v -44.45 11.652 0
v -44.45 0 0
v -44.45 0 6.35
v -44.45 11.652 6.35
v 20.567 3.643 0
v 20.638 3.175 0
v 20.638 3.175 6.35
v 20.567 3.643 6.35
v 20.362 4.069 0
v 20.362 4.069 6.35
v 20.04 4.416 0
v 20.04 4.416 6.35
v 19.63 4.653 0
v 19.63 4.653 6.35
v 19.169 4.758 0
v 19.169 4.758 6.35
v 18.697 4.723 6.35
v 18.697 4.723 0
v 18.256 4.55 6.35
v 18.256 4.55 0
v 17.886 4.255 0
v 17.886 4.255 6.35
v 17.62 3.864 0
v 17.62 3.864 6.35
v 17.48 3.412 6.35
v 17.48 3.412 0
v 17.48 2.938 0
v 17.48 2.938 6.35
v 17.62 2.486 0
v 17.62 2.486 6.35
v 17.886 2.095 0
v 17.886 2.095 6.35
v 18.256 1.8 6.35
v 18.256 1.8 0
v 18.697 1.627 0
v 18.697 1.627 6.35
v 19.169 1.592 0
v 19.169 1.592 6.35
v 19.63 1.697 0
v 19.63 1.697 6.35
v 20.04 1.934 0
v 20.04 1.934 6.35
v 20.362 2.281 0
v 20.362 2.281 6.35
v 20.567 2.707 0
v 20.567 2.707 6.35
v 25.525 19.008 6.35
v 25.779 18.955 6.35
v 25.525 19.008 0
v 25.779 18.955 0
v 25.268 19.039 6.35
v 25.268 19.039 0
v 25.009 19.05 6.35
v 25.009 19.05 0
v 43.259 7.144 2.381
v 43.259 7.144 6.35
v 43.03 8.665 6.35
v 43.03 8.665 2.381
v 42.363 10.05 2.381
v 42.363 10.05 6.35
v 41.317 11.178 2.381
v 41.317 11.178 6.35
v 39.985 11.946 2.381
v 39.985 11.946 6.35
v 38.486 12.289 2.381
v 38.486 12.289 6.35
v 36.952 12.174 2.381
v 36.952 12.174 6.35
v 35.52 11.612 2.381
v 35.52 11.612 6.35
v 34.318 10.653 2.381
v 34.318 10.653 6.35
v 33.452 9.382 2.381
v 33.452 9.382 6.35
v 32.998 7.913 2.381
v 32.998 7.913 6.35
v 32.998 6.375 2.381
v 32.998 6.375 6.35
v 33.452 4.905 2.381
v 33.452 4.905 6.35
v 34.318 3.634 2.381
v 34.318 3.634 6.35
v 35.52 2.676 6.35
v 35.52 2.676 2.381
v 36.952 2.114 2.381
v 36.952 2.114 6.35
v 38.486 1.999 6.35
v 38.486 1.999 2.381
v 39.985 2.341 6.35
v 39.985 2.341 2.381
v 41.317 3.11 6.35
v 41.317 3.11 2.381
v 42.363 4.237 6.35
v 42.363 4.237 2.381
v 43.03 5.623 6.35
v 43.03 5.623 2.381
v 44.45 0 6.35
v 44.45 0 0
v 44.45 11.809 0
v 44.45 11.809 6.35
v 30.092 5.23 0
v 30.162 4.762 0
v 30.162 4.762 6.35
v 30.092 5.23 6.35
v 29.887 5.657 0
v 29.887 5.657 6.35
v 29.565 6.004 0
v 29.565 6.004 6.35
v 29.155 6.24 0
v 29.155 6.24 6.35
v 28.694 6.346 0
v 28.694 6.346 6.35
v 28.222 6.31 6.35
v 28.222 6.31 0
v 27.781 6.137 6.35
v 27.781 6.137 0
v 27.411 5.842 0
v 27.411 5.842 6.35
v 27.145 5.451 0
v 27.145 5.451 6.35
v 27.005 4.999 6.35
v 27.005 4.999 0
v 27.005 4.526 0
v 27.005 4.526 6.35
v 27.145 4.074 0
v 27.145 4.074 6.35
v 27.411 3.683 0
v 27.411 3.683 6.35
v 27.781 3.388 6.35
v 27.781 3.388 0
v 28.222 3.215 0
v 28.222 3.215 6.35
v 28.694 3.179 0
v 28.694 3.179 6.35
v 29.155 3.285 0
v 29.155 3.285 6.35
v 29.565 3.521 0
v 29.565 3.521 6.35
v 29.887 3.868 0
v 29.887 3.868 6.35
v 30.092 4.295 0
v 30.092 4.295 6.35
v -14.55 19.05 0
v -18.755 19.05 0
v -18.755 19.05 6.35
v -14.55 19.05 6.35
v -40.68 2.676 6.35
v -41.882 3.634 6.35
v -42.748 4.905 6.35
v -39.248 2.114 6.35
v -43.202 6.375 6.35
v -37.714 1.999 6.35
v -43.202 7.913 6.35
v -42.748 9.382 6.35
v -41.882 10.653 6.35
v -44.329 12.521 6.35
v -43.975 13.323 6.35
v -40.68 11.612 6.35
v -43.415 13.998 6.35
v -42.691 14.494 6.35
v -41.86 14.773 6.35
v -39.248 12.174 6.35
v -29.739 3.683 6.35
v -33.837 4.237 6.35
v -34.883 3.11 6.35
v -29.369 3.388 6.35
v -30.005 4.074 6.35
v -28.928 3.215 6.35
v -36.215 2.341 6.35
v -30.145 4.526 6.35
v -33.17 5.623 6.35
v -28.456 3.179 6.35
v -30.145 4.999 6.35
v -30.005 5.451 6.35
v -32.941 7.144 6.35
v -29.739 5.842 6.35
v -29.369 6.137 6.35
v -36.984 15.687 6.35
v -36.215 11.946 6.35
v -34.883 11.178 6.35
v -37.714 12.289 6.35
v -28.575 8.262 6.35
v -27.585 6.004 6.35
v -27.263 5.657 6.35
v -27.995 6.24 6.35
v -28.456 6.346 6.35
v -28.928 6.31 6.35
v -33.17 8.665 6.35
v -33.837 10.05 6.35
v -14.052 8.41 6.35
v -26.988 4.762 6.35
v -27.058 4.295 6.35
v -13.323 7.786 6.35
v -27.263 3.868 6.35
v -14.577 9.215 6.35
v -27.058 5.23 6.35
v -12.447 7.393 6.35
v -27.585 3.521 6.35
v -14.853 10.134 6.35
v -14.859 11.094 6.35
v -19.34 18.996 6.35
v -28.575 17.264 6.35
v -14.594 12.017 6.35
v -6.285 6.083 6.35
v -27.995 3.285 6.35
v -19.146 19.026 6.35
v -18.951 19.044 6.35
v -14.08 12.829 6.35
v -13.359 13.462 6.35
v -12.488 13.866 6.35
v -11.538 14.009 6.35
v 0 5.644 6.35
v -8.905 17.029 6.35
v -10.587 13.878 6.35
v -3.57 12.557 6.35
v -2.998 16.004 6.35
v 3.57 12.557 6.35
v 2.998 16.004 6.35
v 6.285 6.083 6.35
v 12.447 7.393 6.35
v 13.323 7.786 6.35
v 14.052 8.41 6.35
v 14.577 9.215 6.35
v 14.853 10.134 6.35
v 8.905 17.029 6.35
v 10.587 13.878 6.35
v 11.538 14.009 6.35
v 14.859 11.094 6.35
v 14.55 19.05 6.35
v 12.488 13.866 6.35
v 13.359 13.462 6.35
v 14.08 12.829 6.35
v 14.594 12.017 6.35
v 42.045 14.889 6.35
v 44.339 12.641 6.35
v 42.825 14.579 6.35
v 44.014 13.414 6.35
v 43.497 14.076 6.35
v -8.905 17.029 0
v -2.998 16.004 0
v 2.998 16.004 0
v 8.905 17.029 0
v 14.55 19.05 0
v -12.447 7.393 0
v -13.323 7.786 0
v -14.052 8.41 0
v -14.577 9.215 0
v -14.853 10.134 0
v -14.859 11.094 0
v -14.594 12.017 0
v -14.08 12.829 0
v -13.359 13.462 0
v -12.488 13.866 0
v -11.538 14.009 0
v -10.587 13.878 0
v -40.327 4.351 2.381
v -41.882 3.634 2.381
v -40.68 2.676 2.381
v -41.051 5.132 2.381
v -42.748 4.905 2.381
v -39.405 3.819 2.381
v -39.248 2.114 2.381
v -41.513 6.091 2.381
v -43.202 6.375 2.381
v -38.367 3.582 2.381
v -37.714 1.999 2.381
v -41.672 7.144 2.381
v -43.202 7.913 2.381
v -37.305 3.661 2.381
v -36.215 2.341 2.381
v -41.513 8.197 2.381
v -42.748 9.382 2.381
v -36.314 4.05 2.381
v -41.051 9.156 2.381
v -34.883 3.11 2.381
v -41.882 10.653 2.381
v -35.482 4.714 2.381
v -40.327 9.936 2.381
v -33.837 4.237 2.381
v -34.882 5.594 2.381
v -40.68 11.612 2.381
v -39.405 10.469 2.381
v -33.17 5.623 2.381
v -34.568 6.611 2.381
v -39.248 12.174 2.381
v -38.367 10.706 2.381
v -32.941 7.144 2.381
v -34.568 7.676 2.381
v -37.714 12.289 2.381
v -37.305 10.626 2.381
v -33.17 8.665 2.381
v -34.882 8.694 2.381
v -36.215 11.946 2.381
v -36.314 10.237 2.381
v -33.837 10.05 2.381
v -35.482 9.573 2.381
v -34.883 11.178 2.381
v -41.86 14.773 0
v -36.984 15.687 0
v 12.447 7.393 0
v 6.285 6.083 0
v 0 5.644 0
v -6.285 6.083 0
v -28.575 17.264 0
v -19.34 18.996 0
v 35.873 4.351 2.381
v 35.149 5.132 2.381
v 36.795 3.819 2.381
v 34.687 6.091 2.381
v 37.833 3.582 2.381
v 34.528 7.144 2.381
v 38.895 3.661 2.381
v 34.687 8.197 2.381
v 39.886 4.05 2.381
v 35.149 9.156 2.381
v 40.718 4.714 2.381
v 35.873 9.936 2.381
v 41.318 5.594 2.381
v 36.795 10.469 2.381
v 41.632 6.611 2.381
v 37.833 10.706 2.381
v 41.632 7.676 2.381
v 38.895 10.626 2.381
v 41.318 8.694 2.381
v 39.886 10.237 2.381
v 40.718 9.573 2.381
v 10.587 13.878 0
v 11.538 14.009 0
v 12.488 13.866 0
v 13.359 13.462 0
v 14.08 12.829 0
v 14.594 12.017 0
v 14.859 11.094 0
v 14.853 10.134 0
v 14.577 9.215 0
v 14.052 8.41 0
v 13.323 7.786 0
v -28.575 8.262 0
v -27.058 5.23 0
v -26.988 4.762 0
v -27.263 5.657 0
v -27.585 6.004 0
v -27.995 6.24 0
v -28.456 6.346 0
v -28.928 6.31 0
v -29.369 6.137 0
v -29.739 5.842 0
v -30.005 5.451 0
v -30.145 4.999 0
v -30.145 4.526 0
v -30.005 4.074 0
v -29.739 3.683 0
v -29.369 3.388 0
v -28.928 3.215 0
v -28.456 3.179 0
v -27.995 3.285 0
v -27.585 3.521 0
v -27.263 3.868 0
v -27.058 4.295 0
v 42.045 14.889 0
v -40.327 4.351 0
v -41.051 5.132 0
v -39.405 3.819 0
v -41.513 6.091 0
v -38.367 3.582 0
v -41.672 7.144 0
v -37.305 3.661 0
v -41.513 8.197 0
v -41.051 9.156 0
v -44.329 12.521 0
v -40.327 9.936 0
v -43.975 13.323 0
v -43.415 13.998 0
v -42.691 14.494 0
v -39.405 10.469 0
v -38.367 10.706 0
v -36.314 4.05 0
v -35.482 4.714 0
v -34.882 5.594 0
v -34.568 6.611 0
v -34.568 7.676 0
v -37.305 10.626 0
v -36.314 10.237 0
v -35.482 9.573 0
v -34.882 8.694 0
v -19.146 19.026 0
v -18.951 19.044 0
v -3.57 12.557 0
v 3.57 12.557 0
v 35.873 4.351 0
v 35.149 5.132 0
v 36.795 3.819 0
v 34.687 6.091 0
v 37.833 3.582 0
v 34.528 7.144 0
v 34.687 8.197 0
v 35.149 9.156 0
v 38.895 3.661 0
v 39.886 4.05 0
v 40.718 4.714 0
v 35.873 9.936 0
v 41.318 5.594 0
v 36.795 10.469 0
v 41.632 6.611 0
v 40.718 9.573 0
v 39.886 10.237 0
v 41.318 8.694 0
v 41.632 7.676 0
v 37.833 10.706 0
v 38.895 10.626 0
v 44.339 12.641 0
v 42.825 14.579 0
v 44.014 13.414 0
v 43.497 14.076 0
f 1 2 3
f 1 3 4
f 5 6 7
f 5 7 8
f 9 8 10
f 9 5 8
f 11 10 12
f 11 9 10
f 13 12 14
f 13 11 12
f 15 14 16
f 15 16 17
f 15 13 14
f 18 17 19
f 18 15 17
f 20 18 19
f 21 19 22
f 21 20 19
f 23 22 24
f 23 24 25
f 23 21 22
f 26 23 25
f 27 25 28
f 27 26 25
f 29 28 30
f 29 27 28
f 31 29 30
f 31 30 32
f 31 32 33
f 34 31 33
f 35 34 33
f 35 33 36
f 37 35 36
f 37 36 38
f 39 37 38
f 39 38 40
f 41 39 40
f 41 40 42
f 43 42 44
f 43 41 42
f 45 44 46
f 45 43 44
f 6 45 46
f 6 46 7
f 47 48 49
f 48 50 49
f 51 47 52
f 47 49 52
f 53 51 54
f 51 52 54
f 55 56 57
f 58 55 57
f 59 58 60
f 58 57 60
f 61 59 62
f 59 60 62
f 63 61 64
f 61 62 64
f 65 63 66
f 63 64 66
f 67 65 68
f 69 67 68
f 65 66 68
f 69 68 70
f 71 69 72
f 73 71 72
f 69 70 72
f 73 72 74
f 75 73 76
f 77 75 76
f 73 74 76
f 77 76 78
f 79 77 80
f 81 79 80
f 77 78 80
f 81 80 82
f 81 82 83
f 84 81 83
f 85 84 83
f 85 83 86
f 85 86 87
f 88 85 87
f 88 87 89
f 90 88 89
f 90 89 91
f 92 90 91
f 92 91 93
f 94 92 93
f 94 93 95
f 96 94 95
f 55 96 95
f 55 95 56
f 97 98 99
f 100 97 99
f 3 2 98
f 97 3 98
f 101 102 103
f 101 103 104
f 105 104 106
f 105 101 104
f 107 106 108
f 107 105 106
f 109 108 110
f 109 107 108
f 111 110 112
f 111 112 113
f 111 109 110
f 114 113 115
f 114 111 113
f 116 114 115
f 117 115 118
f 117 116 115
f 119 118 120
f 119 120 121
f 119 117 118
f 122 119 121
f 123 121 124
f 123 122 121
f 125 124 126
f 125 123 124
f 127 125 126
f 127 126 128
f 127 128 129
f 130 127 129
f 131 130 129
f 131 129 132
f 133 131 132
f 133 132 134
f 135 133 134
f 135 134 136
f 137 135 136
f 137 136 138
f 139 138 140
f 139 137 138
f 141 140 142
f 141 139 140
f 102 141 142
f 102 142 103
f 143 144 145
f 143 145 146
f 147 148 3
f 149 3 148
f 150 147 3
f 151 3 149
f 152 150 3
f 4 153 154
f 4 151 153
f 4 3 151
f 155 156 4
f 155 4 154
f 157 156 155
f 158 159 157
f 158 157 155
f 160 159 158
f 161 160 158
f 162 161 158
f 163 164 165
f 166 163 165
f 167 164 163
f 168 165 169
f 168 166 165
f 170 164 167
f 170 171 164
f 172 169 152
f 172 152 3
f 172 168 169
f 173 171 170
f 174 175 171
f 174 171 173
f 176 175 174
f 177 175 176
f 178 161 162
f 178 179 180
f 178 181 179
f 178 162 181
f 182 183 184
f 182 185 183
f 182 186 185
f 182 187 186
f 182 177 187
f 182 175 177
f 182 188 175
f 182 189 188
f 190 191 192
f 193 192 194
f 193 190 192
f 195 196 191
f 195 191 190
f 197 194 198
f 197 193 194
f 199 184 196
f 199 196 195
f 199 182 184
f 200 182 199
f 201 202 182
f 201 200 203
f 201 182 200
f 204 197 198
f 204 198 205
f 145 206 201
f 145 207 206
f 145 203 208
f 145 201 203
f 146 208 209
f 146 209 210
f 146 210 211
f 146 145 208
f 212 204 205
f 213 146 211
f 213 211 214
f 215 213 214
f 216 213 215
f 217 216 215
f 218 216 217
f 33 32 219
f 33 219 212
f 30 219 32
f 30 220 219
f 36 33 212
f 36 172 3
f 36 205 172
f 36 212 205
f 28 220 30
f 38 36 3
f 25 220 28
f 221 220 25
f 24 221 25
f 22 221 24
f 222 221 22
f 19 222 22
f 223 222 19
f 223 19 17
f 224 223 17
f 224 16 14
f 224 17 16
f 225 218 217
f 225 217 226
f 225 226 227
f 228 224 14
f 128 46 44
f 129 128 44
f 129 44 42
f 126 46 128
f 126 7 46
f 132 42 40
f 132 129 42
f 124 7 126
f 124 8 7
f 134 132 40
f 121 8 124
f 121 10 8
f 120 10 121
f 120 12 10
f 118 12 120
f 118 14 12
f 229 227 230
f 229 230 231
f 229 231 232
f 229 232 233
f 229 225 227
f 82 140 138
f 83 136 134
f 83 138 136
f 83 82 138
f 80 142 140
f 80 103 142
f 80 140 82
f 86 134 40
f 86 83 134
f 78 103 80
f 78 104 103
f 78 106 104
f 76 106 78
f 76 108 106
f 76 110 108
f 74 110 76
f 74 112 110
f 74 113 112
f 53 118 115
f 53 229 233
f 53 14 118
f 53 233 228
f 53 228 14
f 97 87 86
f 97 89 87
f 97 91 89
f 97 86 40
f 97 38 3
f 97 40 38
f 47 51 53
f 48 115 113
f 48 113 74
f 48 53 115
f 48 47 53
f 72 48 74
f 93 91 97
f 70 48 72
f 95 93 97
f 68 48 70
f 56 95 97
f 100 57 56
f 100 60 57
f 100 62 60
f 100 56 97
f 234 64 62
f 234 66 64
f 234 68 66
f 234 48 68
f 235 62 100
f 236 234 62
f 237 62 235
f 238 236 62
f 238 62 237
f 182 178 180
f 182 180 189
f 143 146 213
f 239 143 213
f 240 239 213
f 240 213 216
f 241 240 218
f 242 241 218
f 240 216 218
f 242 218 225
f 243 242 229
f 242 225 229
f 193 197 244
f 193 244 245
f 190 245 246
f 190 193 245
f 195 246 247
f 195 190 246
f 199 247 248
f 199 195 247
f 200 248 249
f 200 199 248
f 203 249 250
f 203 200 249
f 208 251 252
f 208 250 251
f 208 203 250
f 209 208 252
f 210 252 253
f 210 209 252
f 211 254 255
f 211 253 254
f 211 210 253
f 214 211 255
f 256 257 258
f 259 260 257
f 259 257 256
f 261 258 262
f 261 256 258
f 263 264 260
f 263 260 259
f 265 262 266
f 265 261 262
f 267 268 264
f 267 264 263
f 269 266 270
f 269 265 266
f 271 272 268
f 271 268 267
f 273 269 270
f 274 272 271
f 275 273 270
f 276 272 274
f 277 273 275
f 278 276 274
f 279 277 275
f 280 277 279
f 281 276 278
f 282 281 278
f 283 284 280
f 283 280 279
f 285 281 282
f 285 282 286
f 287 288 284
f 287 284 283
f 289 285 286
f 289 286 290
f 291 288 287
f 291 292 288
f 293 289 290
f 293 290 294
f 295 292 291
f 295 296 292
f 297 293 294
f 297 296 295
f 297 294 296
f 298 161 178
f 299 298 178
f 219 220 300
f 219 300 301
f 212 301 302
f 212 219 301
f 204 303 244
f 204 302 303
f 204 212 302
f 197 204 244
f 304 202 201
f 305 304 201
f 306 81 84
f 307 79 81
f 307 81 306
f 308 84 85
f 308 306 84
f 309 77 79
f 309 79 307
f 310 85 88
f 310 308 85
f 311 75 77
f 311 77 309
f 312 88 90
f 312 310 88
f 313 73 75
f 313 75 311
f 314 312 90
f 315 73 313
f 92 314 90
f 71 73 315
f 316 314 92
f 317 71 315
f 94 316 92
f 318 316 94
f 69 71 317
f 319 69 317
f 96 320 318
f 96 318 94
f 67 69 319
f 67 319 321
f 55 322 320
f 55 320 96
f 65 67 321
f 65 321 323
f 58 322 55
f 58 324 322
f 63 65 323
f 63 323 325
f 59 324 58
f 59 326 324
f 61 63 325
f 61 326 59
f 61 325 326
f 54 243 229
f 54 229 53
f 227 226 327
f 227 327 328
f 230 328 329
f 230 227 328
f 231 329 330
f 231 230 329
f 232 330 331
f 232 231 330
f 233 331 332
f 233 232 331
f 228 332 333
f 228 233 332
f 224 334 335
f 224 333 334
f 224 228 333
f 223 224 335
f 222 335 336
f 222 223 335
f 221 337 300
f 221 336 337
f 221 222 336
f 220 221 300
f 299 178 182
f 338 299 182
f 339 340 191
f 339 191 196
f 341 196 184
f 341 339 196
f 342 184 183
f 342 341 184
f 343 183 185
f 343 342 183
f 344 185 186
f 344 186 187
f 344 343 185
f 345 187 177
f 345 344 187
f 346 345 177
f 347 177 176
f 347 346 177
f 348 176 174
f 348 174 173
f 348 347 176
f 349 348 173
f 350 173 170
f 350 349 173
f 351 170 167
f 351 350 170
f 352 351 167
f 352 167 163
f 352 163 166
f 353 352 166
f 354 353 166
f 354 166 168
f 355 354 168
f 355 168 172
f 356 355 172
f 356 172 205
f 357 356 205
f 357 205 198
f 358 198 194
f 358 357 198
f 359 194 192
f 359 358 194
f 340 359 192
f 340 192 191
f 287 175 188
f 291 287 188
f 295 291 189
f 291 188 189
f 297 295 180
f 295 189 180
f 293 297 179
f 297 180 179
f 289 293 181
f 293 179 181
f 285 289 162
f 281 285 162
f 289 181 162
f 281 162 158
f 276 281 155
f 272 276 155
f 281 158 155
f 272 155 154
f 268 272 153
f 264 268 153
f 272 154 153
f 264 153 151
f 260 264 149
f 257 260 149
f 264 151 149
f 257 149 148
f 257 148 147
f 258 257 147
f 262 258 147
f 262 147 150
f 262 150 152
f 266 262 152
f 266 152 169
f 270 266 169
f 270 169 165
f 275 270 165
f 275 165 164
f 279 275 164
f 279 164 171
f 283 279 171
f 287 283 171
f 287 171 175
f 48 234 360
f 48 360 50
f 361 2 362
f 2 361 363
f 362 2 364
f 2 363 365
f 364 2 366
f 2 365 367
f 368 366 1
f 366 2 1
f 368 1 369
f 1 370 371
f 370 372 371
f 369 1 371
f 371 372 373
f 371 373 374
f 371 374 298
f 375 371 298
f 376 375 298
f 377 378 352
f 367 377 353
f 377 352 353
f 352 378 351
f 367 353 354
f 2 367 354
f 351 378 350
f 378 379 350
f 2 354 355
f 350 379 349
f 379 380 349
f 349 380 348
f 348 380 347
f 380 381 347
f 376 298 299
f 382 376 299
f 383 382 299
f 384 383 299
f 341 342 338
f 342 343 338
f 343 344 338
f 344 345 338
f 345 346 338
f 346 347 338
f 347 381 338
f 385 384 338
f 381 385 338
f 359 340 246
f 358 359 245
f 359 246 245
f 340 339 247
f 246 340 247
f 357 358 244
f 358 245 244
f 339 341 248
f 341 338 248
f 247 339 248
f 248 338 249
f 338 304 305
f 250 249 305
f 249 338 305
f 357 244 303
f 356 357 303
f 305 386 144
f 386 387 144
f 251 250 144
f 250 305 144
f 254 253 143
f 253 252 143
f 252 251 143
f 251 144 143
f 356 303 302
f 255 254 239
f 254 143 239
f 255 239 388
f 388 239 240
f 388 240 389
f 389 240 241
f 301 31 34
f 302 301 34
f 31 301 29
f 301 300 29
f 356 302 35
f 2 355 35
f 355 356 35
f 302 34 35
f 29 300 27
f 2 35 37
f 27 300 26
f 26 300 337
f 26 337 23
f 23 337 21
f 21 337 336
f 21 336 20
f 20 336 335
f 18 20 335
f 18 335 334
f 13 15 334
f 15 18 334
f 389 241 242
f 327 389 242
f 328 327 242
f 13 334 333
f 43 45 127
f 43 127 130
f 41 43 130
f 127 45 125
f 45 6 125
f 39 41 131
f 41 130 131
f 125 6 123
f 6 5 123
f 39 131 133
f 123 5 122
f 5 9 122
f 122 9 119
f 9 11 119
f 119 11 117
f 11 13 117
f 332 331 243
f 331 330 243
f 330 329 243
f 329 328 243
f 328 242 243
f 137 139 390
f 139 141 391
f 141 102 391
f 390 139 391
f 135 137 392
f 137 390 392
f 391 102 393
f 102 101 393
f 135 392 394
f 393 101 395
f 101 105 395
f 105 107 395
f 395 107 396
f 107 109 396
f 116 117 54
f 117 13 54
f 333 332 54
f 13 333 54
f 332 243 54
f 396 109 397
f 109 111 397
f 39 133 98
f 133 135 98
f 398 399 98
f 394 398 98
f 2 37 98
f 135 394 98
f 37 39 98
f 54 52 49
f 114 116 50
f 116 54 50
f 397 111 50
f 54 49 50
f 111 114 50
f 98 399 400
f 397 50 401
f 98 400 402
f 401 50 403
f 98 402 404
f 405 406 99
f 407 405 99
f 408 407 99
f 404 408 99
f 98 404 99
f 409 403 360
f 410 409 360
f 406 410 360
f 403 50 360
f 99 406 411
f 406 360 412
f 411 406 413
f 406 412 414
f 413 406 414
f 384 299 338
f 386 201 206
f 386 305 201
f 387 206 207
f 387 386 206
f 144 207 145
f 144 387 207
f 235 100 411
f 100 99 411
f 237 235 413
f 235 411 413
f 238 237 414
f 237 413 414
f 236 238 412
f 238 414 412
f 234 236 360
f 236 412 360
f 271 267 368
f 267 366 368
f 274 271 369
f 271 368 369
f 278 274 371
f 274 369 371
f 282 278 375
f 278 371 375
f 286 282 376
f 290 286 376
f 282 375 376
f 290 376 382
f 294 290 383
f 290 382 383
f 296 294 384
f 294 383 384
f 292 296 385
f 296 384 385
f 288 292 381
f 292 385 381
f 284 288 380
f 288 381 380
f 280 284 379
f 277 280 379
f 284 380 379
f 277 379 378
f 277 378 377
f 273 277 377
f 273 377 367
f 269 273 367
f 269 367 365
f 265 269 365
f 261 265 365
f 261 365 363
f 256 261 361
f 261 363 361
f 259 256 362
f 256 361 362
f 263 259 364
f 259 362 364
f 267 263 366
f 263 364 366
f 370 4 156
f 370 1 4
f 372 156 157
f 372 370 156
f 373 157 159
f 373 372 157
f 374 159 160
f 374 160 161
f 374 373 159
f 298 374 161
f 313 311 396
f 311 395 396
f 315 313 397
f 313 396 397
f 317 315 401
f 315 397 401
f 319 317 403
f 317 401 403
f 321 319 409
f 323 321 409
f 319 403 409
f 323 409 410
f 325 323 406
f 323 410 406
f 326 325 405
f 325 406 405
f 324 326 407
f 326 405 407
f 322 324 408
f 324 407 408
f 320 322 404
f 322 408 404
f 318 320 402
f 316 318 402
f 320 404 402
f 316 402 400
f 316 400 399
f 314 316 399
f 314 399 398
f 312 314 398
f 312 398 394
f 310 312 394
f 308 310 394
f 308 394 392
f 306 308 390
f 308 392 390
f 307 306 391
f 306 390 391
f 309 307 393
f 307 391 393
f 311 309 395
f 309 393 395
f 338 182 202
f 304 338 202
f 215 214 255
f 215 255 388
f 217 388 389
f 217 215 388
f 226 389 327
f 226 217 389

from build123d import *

# Parameters (mm, degrees)
SKETCH1_W          = 88.9
SKETCH1_H          = 19.05
BASE_EXTRUDE_DEPTH = 6.35
CUT_EXTRUDE1_DEPTH = 49.775275499
CUT_EXTRUDE2_DEPTH = 49.775275499
CUT_EXTRUDE3_DEPTH = 49.775275499
CUT_EXTRUDE4_DEPTH = 49.775275499
CUT_EXTRUDE5_DEPTH = 49.775275499
FILLET1_R          = 3.175
HOLE1_D            = 7.14375
HOLE1_CBORE_D      = 10.31875
HOLE1_CBORE_DEPTH  = 3.96875
LPATTERN1_COUNT    = 2
LPATTERN1_PITCH    = 76.2
HOLE2_OUTLINE_R    = 1.5875
HOLE2_DEPTH        = 6.35
HOLE3_OUTLINE_R    = 1.5875
HOLE3_DEPTH        = 6.35
LPATTERN2_COUNT    = 2
LPATTERN2_PITCH    = 57.15


# Read off the part's stored shape, not the designer's step: Hole2, Hole3
with BuildPart() as part:
    # Sketch1 → Base-Extrude (new body)
    with BuildSketch(Plane.XY):
        with Locations((0, 9.525)):
            Rectangle(SKETCH1_W, SKETCH1_H)
    extrude(amount=BASE_EXTRUDE_DEPTH)

    # Sketch2 → Cut-Extrude1 (cut, through all)
    with BuildSketch(Plane.XY.offset(6.35)):
        Polygon((44.45, 14.2875), (25.4, 19.05), (44.45, 19.05), align=None)
    extrude(amount=-CUT_EXTRUDE1_DEPTH, mode=Mode.SUBTRACT)

    # Sketch3 → Cut-Extrude2 (cut, through all)
    with BuildSketch(Plane.XY.offset(6.35)):
        with BuildLine():
            Line((-136.365872597, 74.873193339), (-14.549677831, 19.05))
            ThreePointArc((-14.549677831, 19.05), (0, 15.875), (14.549677831, 19.05))
            Line((14.549677831, 19.05), (136.365872597, 74.873193339))
            Line((136.365872597, 74.873193339), (136.365872597, 342.868821823))
            Line((136.365872597, 342.868821823), (-136.365872597, 342.868821823))
            Line((-136.365872597, 342.868821823), (-136.365872597, 74.873193339))
        make_face()
    extrude(amount=-CUT_EXTRUDE2_DEPTH, mode=Mode.SUBTRACT)

    # Sketch4 → Cut-Extrude3 (cut, through all)
    with BuildSketch(Plane.XY.offset(6.35)):
        Polygon((-231.275885049, -20.742353447), (-44.45, 14.2875), (-19.05, 19.05), (167.775885049, 54.079853447), (97.716178156, 427.731623544), (-301.335591942, 352.909416651), align=None)
    extrude(amount=-CUT_EXTRUDE3_DEPTH, mode=Mode.SUBTRACT)

    # Sketch5 → Cut-Extrude4 (cut, through all)
    with BuildSketch(Plane.XY.offset(6.35)):
        Polygon((-36.984386732, 15.687302488), (-28.575, 8.262261056), (-28.575, 17.2640625), align=None)
    extrude(amount=-CUT_EXTRUDE4_DEPTH, mode=Mode.SUBTRACT)

    # Sketch6 → Cut-Extrude5 (cut, through all)
    with BuildSketch(Plane.XY.offset(6.35)):
        with BuildLine():
            ThreePointArc((-10.587110246, 13.878358811), (0, 12.3904375), (10.587110246, 13.878358811))
            ThreePointArc((10.587110246, 13.878358811), (14.75971189, 11.565447951), (12.446801031, 7.392846306))
            ThreePointArc((12.446801031, 7.392846306), (0, 5.6435625), (-12.446801031, 7.392846306))
            ThreePointArc((-12.446801031, 7.392846306), (-14.75971189, 11.565447951), (-10.587110246, 13.878358811))
        make_face()
    extrude(amount=-CUT_EXTRUDE5_DEPTH, mode=Mode.SUBTRACT)

    # Fillet1
    fillet1_edges = [part.edges().sort_by_distance(p)[0] for p in [
        (44.45, 14.2875, 3.175),
        (25.4, 19.05, 3.175),
        (-19.05, 19.05, 3.175),
        (-44.45, 14.2875, 3.175),
    ]]
    fillet(fillet1_edges, radius=FILLET1_R)

    # Hole1 (through all)
    with Locations(Plane.XY.offset(6.35)):
        with Locations((38.1, 7.14375)):
            hole1 = CounterBoreHole(HOLE1_D / 2, HOLE1_CBORE_D / 2, HOLE1_CBORE_DEPTH)

    # LPattern1: Hole1 ×2
    with Locations(*[(-i * LPATTERN1_PITCH, 0, 0) for i in range(1, LPATTERN1_COUNT)]):
        add(hole1, mode=Mode.SUBTRACT)

    # Hole2 outline → Hole2 (cut)
    with BuildSketch(Plane.XY):
        with Locations((28.575, 4.7625)):
            Circle(HOLE2_OUTLINE_R)
    hole2 = extrude(amount=HOLE2_DEPTH, mode=Mode.SUBTRACT)

    # Hole3 outline → Hole3 (cut)
    with BuildSketch(Plane.XY):
        with Locations((19.05, 3.175)):
            Circle(HOLE3_OUTLINE_R)
    extrude(amount=HOLE3_DEPTH, mode=Mode.SUBTRACT)

    # LPattern2: Hole2 ×2
    with Locations(*[(-i * LPATTERN2_PITCH, 0, 0) for i in range(1, LPATTERN2_COUNT)]):
        add(hole2, mode=Mode.SUBTRACT)


solid = part.part
